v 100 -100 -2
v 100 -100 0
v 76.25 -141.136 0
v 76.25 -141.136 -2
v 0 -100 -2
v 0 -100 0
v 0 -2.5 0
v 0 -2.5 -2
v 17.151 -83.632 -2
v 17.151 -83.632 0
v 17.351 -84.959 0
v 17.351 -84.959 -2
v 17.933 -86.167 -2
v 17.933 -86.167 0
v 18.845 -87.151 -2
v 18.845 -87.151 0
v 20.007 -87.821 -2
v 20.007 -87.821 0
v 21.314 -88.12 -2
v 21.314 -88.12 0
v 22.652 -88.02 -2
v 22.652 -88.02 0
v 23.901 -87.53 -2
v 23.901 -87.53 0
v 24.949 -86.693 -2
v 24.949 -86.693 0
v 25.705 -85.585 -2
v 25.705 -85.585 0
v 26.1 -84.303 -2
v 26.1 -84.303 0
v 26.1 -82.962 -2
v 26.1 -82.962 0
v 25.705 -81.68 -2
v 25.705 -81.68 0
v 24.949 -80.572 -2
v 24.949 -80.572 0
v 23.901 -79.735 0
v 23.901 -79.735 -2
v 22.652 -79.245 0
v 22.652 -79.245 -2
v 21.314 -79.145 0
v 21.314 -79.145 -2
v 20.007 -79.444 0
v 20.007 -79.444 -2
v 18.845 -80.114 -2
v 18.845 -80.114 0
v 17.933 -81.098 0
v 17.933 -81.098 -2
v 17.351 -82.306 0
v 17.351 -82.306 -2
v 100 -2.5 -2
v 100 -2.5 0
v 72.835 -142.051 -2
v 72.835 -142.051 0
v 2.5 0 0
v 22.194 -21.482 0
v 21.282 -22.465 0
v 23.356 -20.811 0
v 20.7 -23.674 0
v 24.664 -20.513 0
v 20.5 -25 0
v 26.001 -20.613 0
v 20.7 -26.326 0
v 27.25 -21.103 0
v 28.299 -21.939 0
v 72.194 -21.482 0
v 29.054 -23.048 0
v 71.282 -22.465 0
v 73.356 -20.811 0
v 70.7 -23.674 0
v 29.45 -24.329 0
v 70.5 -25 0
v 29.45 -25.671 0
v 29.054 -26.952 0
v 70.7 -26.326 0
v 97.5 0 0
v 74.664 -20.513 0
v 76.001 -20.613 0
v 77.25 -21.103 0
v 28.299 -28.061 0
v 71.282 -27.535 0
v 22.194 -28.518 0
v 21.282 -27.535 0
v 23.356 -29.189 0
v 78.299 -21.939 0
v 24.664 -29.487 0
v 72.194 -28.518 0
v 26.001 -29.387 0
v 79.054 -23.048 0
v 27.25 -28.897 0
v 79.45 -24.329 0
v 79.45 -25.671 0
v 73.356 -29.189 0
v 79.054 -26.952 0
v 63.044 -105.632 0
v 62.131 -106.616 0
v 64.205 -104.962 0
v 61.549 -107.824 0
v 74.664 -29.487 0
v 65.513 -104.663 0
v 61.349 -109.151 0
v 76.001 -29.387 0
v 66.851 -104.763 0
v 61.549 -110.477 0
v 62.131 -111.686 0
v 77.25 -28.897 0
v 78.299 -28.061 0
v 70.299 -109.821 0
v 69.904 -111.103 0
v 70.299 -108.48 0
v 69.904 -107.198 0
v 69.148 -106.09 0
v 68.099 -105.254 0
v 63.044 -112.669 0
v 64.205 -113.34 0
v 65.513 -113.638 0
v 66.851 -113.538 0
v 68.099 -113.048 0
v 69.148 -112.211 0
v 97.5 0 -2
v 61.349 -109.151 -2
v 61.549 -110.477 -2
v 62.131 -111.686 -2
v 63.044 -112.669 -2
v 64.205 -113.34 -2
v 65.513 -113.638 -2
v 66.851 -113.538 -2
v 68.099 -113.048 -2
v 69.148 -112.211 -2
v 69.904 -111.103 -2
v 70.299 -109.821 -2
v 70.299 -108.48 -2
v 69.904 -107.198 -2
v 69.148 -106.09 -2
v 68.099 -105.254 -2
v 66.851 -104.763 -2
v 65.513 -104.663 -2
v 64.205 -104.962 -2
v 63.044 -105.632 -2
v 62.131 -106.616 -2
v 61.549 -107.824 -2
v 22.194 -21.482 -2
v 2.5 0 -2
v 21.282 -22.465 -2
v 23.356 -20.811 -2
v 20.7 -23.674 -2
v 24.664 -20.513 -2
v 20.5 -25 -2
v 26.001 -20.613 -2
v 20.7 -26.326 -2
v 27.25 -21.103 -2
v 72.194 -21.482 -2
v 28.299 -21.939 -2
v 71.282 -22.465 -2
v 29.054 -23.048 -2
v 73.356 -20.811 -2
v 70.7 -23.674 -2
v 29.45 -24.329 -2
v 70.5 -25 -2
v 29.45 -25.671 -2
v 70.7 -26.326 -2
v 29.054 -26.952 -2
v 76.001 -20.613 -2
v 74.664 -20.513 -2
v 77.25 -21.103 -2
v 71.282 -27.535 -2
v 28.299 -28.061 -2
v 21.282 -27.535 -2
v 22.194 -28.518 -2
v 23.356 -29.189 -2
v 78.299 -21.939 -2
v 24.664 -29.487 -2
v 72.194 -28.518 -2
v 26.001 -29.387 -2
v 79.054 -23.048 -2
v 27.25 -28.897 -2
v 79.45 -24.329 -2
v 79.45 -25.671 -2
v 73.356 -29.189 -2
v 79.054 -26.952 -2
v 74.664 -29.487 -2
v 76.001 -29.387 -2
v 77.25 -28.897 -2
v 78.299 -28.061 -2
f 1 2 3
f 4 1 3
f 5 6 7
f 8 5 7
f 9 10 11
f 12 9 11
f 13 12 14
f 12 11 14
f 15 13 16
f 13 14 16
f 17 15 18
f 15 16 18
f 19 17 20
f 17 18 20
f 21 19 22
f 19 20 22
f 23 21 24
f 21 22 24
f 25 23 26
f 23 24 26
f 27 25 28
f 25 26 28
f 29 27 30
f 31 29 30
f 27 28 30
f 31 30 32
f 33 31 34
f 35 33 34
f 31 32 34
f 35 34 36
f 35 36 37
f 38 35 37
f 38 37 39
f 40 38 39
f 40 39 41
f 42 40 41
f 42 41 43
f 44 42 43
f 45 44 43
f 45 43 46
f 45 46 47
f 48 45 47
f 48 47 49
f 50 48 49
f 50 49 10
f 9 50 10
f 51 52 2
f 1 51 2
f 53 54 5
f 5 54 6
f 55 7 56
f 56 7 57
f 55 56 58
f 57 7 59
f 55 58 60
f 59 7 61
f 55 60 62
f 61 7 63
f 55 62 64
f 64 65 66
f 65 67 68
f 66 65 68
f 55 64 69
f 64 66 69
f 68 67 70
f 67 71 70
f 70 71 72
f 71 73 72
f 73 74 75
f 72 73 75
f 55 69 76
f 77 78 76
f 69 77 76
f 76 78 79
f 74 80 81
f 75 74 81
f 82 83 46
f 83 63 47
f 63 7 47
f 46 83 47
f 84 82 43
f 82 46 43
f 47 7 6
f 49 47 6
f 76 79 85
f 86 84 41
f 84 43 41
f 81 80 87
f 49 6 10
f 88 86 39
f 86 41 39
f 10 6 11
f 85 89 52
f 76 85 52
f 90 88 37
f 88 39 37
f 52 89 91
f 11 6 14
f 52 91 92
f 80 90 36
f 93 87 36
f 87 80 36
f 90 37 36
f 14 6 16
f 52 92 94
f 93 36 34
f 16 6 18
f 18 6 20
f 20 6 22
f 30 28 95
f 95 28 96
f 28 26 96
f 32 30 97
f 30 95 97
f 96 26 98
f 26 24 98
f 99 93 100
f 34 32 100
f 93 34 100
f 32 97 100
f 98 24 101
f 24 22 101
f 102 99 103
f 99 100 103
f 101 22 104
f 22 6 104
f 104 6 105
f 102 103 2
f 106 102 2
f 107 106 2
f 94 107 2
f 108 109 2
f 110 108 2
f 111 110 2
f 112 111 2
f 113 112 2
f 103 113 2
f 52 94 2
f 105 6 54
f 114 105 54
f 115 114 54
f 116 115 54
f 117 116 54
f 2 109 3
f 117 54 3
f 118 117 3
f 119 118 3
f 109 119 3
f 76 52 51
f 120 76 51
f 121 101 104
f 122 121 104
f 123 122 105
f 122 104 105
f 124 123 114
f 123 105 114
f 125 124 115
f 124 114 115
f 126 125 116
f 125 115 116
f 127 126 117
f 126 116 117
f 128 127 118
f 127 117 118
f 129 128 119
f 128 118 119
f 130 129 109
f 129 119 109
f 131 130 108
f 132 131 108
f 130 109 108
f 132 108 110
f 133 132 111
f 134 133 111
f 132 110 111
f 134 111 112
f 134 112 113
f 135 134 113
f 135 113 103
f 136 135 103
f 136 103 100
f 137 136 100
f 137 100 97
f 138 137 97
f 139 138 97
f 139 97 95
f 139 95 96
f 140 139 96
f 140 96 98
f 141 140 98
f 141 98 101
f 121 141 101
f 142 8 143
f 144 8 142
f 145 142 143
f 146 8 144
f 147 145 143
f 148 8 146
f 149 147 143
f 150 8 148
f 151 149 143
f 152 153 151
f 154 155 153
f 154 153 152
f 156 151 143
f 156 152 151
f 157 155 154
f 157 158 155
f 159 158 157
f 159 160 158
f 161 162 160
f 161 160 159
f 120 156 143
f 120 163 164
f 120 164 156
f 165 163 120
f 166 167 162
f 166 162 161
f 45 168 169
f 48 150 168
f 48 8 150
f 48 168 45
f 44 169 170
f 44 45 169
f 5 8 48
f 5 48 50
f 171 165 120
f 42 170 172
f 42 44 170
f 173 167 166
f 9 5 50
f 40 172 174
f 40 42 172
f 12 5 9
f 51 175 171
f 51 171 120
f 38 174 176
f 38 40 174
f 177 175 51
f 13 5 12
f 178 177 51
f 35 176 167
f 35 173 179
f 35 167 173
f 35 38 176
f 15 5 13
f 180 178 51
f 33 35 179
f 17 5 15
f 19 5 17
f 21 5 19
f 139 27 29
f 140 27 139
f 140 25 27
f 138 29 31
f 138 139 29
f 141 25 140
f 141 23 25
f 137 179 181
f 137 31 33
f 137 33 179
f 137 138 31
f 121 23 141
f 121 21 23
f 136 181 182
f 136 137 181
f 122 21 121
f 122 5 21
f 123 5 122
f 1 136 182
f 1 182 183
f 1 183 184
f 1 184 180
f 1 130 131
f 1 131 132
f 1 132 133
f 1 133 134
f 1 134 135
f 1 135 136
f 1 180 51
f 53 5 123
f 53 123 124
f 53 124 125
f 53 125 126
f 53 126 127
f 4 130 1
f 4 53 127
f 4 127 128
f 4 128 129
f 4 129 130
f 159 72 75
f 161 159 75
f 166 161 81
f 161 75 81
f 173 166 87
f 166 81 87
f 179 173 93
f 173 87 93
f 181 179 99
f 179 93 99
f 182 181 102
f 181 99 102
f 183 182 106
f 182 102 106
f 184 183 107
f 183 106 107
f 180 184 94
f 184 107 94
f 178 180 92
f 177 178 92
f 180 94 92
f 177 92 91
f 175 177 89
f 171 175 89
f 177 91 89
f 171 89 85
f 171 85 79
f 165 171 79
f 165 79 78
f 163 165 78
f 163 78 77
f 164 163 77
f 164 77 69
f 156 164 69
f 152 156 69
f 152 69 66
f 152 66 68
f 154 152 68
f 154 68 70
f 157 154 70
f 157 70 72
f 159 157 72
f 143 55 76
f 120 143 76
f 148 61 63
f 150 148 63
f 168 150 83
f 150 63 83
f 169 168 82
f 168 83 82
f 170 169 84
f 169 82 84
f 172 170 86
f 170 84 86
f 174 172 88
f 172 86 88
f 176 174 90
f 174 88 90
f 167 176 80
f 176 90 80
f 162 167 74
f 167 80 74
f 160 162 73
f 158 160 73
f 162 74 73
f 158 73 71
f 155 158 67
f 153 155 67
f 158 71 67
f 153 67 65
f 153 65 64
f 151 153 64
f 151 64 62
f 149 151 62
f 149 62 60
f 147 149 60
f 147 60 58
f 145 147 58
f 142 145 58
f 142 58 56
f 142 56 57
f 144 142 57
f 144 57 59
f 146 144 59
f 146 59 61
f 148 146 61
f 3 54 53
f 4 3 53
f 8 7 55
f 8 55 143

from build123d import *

# Parameters (mm, degrees)
EXTRUDE_1_DEPTH   = 2
HOLE_WIZARD_M81_D = 9
CHAMFER_1_SIZE    = 2.5


with BuildPart() as part:
    # Эскиз3 → Бобышка-Вытянуть1 (new body)
    with BuildSketch(Plane(origin=(0, 0, 0), x_dir=(1, 0, 0), z_dir=(0, 0, -1))):
        Polygon((0, 0), (100, 0), (100, 100), (75, 143.301270189), (0, 100), align=None)
    extrude(amount=EXTRUDE_1_DEPTH)

    # Отверстие с зазором M81 (through all)
    with Locations(Plane(origin=(0, 0, -2), x_dir=(1, 0, 0), z_dir=(0, 0, -1))):
        with Locations((25, 25), (75, 25), (21.650635095, 83.632486541), (65.849364905, 109.150635095)):
            Hole(HOLE_WIZARD_M81_D / 2)

    # Фаска1
    chamfer_1_edges = [part.edges().sort_by_distance(p)[0] for p in [
        (75, -143.301270189, -1),
        (100, 0, -1),
        (0, 0, -1),
    ]]
    chamfer(chamfer_1_edges, length=CHAMFER_1_SIZE)


solid = part.part
